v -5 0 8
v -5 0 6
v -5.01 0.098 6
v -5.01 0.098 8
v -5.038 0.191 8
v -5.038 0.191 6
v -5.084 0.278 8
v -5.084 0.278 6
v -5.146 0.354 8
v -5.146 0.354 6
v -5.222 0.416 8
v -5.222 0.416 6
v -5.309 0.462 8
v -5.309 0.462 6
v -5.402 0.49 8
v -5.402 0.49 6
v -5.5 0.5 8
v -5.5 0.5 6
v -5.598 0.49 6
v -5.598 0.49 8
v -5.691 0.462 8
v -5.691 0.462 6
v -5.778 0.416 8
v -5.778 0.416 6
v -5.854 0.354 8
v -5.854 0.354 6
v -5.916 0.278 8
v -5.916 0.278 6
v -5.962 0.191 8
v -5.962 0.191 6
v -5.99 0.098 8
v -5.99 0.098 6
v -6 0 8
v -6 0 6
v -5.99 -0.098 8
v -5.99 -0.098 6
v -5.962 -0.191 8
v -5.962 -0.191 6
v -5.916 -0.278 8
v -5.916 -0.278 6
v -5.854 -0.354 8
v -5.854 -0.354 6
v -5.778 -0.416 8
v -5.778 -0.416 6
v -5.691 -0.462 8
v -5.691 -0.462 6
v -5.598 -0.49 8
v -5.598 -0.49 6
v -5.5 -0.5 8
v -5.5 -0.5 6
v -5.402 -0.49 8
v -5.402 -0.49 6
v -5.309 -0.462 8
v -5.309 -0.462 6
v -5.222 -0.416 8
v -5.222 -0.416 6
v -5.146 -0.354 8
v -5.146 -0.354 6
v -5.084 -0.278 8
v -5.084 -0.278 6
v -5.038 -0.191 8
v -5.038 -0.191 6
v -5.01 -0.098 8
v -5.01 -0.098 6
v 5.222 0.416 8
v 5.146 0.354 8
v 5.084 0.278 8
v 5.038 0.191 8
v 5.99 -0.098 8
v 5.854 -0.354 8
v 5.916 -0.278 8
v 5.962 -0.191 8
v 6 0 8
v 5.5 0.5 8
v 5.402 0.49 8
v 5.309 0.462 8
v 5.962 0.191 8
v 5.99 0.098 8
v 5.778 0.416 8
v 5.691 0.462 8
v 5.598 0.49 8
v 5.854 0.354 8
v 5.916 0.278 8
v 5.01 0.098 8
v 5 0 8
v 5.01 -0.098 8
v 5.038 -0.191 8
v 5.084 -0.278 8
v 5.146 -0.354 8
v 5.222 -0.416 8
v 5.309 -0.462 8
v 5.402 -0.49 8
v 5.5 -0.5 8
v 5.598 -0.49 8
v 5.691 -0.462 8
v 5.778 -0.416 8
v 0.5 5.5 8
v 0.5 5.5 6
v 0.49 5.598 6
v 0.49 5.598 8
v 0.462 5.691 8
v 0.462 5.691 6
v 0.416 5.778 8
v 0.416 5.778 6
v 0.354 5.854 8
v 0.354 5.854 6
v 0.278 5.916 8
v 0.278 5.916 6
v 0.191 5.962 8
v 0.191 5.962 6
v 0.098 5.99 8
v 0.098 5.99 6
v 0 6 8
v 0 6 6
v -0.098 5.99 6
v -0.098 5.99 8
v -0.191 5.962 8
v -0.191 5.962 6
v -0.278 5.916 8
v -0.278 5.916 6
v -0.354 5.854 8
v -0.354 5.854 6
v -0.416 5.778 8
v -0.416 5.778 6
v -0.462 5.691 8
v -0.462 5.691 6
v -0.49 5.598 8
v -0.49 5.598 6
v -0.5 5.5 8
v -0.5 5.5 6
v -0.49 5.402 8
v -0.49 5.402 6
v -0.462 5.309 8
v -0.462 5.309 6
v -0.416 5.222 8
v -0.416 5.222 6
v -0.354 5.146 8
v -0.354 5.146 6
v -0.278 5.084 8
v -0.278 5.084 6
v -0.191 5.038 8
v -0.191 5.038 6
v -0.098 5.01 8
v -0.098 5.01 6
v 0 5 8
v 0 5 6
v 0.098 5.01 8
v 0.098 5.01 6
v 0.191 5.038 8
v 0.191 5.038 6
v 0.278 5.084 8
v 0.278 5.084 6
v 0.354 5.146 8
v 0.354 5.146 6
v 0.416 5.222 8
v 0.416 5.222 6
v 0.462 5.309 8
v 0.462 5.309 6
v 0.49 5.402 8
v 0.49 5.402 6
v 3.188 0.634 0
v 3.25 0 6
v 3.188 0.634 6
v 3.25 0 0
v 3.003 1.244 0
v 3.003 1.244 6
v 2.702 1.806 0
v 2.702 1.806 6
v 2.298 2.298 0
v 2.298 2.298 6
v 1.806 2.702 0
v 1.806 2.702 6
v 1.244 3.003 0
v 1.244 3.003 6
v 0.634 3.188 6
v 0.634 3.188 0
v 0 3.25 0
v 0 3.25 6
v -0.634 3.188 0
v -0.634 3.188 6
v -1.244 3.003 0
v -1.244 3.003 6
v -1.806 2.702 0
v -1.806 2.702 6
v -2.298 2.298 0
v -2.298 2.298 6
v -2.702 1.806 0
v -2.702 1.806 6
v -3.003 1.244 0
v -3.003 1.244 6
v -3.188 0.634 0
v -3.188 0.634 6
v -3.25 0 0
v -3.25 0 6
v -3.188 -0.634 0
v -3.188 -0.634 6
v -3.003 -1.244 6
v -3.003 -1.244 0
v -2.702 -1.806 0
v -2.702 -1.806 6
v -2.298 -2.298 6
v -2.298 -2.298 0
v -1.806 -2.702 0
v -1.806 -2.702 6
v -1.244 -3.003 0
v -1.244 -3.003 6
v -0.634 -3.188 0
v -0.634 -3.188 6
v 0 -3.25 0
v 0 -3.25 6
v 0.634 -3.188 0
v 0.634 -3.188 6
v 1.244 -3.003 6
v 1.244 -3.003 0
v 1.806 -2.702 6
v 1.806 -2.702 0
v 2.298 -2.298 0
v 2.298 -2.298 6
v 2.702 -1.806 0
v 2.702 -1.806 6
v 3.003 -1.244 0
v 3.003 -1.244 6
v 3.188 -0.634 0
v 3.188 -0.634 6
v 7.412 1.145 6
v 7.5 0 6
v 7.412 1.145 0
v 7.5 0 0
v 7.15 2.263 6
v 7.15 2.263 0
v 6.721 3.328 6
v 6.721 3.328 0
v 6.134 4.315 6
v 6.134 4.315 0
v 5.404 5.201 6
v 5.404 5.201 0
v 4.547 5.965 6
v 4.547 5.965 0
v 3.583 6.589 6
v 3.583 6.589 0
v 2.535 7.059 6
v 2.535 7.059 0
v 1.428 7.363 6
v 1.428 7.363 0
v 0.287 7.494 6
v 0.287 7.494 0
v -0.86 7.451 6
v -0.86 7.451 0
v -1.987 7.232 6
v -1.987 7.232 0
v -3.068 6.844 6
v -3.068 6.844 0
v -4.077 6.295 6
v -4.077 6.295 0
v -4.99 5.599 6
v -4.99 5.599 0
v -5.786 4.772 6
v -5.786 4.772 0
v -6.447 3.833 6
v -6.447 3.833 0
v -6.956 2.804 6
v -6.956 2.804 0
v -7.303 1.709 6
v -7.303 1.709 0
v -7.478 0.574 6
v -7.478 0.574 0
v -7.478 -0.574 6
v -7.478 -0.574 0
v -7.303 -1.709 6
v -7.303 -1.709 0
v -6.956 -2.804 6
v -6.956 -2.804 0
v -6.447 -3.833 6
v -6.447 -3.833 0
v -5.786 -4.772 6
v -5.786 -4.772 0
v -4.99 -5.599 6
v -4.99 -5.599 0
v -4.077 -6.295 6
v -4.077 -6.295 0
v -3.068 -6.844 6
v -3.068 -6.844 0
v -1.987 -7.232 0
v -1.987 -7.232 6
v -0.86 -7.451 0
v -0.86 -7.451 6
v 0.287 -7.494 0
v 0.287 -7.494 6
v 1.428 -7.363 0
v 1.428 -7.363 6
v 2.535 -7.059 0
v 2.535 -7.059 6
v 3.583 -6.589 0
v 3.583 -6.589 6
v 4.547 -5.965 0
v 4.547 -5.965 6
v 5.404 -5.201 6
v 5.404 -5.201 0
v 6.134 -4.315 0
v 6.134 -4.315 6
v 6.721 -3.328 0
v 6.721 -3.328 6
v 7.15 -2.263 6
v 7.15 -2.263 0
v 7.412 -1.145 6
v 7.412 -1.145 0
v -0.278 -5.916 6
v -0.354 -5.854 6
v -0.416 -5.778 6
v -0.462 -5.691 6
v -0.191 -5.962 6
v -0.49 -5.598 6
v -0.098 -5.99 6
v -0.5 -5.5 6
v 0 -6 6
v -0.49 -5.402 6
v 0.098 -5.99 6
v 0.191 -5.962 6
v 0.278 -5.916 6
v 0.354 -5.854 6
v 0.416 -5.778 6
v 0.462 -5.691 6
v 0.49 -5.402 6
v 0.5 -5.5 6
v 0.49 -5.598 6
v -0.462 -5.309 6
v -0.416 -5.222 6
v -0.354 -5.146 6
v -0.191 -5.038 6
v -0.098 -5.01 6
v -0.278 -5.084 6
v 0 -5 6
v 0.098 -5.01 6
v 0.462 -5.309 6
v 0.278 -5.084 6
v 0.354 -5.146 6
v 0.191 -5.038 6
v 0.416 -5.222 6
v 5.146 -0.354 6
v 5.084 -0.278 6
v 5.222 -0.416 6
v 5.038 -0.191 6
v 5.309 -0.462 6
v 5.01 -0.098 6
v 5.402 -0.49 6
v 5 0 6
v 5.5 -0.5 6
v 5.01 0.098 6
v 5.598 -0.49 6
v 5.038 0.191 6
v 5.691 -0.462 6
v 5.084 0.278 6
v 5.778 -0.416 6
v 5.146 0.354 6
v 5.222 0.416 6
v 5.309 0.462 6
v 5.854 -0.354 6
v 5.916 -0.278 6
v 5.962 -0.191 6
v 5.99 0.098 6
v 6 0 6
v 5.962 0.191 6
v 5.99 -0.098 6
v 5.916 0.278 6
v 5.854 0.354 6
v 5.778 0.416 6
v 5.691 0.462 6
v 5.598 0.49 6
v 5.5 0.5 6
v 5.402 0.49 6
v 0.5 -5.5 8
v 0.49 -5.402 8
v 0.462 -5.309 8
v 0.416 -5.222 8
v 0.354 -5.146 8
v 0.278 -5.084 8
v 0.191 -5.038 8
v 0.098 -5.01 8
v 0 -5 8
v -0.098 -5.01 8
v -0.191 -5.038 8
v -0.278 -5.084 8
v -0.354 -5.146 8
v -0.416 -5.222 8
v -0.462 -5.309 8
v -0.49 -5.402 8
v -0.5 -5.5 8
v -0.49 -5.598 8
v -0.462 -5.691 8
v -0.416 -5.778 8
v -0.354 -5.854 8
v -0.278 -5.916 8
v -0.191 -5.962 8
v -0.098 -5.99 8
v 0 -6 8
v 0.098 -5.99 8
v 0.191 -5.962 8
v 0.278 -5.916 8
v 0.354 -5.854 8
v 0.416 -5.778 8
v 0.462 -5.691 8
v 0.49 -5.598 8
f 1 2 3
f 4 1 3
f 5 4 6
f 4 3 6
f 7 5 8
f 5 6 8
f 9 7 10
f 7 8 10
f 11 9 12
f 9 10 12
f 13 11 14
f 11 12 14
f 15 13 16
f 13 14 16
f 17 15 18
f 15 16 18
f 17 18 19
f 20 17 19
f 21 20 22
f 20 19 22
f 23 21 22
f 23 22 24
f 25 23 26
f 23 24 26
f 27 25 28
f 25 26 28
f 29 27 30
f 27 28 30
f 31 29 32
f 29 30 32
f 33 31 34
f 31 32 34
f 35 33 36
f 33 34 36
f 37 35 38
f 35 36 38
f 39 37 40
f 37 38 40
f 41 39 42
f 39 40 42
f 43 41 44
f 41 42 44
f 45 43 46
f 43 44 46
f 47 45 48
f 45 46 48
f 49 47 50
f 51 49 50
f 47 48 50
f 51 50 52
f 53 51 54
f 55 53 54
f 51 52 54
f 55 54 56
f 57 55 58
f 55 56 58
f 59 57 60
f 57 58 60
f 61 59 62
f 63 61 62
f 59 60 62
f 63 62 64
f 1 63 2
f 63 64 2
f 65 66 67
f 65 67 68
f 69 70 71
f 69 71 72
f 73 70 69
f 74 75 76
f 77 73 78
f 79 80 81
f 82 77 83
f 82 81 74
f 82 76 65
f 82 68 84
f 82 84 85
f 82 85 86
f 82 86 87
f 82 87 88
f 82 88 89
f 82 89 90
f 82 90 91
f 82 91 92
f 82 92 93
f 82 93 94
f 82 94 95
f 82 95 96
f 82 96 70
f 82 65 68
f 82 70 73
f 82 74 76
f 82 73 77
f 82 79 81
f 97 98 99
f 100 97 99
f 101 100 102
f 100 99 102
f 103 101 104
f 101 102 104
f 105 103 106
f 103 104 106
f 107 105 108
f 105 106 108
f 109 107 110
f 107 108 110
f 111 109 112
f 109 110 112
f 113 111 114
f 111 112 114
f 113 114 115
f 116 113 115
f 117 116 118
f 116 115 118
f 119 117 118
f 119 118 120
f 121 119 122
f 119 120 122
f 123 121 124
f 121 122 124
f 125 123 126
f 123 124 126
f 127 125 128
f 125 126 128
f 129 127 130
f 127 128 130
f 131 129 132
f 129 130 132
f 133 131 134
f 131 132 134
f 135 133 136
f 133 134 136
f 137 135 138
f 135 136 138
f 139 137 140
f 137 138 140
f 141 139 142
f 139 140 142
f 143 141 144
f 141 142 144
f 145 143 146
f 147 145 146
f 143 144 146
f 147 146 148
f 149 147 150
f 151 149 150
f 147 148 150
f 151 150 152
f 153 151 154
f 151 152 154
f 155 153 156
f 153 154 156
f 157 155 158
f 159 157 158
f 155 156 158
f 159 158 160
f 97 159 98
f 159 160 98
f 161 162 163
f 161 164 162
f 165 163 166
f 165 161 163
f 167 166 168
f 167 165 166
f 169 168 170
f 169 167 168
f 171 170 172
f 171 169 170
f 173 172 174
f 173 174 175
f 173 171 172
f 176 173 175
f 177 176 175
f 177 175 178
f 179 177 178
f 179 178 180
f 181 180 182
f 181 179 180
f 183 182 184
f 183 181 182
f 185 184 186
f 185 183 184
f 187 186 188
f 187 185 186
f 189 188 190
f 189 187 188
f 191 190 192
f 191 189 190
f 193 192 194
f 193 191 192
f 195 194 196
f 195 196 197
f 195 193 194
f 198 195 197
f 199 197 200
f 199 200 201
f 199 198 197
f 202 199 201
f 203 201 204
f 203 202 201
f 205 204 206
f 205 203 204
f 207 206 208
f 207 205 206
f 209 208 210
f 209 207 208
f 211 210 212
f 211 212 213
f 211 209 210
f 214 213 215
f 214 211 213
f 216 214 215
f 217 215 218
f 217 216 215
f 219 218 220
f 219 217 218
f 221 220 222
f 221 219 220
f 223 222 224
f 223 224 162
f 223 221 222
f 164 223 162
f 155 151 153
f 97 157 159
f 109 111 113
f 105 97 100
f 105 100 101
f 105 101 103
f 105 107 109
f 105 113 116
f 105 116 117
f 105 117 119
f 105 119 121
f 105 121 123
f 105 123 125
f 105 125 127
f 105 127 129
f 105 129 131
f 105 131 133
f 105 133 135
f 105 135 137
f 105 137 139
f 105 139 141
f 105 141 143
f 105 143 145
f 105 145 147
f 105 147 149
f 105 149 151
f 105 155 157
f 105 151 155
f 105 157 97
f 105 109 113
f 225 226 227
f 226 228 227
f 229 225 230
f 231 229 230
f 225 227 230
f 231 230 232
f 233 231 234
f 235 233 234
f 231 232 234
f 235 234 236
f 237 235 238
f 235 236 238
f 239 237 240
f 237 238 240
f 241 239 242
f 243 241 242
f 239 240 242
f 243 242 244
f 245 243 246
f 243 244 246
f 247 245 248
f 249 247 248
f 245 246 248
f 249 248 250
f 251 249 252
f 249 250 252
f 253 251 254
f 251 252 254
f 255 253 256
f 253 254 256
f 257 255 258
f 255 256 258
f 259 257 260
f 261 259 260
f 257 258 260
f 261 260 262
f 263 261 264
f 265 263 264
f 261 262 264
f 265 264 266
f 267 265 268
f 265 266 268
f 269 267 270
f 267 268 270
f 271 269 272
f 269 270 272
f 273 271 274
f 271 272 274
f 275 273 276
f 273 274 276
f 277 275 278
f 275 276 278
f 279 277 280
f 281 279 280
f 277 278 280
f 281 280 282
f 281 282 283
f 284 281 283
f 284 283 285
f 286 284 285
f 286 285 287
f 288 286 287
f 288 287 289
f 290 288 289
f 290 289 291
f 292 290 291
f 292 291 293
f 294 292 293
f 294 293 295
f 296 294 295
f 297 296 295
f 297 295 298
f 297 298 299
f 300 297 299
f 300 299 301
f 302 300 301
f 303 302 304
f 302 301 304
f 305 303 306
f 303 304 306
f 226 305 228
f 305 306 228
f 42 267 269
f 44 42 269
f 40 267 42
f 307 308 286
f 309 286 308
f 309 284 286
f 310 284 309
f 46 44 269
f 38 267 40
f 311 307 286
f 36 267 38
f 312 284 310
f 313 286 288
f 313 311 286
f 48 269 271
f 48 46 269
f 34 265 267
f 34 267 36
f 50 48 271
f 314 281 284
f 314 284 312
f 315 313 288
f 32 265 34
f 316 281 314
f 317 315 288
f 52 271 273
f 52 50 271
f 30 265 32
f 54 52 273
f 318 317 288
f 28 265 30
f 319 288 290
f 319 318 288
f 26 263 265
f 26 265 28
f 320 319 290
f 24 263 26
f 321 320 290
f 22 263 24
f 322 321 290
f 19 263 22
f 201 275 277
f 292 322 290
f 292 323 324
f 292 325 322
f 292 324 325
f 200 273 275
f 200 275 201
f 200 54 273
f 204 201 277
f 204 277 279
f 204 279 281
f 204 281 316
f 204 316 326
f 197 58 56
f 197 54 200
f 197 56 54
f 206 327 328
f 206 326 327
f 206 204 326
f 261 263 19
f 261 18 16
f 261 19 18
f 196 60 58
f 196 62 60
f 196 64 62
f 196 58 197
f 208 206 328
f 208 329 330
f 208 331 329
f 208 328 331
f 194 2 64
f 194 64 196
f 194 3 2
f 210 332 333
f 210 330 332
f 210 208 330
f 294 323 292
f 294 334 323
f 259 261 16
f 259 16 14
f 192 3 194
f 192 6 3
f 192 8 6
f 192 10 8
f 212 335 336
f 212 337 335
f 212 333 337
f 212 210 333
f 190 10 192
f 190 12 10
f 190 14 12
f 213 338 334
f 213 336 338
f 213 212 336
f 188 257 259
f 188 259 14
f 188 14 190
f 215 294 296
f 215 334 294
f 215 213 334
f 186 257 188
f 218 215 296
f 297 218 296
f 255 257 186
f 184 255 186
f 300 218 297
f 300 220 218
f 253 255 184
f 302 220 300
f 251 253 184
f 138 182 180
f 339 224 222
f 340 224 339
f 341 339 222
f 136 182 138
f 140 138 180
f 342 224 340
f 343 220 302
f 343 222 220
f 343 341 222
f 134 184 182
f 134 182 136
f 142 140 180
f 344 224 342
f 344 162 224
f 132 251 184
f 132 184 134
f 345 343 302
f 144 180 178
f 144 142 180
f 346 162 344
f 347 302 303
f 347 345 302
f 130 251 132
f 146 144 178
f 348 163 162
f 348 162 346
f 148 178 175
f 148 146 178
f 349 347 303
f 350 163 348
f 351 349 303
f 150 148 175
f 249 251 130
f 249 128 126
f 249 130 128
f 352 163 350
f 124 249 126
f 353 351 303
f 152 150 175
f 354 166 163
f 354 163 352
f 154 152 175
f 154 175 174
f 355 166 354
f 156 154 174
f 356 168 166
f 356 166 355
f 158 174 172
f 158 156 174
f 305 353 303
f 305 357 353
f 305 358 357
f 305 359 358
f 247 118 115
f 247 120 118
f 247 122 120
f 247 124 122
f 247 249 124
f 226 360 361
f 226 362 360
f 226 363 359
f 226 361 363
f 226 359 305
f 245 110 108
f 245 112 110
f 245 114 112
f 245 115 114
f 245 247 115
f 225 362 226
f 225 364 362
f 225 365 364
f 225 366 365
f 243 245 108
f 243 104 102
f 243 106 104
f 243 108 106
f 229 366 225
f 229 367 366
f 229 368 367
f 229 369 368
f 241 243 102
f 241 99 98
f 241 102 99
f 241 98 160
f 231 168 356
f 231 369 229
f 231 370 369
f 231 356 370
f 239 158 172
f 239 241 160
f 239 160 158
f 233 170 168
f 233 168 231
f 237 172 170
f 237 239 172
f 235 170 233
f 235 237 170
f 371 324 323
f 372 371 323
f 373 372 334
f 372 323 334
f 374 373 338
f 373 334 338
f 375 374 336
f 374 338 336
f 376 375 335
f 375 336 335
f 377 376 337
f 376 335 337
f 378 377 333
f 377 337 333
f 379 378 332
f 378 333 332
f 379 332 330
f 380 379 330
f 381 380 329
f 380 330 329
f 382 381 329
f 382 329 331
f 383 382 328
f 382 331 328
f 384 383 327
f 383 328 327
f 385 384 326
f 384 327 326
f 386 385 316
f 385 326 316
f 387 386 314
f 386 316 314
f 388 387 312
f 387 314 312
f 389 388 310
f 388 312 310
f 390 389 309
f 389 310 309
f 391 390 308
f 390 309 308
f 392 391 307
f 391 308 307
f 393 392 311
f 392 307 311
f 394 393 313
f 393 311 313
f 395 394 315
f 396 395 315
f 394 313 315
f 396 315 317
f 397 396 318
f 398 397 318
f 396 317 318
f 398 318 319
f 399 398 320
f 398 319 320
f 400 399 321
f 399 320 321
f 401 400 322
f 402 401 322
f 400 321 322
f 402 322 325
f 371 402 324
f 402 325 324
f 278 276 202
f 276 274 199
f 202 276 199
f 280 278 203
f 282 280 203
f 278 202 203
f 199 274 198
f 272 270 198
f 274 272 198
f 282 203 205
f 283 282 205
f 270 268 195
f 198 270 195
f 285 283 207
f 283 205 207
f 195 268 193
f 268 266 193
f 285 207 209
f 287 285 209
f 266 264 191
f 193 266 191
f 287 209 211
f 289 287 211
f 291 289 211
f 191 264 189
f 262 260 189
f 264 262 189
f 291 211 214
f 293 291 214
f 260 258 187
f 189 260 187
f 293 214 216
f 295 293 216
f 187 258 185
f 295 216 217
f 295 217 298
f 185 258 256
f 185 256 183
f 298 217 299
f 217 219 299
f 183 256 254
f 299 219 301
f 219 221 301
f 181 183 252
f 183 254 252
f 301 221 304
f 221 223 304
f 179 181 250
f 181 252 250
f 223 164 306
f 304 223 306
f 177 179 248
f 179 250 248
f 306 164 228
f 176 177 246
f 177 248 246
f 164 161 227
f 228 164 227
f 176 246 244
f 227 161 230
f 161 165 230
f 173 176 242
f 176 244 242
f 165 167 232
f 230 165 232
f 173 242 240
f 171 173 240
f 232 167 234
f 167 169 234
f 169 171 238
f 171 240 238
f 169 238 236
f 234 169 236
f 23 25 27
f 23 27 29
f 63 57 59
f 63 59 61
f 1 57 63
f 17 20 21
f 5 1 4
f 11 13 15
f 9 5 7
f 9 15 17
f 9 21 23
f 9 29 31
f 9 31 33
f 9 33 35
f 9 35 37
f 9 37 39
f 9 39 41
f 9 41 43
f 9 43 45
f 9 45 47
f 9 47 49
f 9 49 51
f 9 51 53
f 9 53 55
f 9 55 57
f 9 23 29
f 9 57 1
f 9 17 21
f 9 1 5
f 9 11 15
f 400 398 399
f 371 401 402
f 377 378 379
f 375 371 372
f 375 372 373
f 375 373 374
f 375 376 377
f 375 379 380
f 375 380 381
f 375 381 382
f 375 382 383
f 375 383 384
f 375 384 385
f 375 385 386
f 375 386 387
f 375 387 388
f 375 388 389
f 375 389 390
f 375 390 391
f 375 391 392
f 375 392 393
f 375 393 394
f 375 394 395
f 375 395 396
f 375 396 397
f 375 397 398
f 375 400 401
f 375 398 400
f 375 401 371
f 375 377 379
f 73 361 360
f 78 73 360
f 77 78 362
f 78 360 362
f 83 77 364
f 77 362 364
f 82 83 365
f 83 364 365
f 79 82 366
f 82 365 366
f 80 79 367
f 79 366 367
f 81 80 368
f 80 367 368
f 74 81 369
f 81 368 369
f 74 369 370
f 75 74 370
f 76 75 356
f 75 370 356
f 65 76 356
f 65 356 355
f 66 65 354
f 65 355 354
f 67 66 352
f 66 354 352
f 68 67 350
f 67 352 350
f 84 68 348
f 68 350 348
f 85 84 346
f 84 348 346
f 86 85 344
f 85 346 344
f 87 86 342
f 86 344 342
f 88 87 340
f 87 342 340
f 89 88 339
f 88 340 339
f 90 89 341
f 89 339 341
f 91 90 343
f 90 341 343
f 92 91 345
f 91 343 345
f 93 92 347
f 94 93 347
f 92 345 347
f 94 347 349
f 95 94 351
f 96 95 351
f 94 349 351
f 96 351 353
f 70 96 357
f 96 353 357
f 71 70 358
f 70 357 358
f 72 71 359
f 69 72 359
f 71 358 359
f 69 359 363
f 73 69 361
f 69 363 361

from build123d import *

# Parameters (mm, degrees)
SZKIC1_R                    = 7.5
SZKIC1_R_2                  = 3.25
DODANIE_WYCI_GNI_CIE1_DEPTH = 4
SZKIC2_R                    = 7.5
SZKIC2_R_2                  = 3.25
DODANIE_WYCI_GNI_CIE2_DEPTH = 2
SZKIC3_R                    = 0.5
DODANIE_WYCI_GNI_CIE3_DEPTH = 2


with BuildPart() as part:
    # Szkic1 → Dodanie-wyciągnięcie1 (new body)
    with BuildSketch(Plane.XY):
        Circle(SZKIC1_R)
        Circle(SZKIC1_R_2, mode=Mode.SUBTRACT)
    extrude(amount=DODANIE_WYCI_GNI_CIE1_DEPTH)

    # Szkic2 → Dodanie-wyciągnięcie2 (add)
    with BuildSketch(Plane.XY.offset(4)):
        Circle(SZKIC2_R)
        Circle(SZKIC2_R_2, mode=Mode.SUBTRACT)
    extrude(amount=DODANIE_WYCI_GNI_CIE2_DEPTH)

    # Szkic3 → Dodanie-wyciągnięcie3 (add)
    with BuildSketch(Plane.XY.offset(6)):
        with Locations((0, 5.5)):
            Circle(SZKIC3_R)
        with Locations((5.5, 0)):
            Circle(SZKIC3_R)
        with Locations((0, -5.5)):
            Circle(SZKIC3_R)
        with Locations((-5.5, 0)):
            Circle(SZKIC3_R)
    extrude(amount=DODANIE_WYCI_GNI_CIE3_DEPTH)


solid = part.part
